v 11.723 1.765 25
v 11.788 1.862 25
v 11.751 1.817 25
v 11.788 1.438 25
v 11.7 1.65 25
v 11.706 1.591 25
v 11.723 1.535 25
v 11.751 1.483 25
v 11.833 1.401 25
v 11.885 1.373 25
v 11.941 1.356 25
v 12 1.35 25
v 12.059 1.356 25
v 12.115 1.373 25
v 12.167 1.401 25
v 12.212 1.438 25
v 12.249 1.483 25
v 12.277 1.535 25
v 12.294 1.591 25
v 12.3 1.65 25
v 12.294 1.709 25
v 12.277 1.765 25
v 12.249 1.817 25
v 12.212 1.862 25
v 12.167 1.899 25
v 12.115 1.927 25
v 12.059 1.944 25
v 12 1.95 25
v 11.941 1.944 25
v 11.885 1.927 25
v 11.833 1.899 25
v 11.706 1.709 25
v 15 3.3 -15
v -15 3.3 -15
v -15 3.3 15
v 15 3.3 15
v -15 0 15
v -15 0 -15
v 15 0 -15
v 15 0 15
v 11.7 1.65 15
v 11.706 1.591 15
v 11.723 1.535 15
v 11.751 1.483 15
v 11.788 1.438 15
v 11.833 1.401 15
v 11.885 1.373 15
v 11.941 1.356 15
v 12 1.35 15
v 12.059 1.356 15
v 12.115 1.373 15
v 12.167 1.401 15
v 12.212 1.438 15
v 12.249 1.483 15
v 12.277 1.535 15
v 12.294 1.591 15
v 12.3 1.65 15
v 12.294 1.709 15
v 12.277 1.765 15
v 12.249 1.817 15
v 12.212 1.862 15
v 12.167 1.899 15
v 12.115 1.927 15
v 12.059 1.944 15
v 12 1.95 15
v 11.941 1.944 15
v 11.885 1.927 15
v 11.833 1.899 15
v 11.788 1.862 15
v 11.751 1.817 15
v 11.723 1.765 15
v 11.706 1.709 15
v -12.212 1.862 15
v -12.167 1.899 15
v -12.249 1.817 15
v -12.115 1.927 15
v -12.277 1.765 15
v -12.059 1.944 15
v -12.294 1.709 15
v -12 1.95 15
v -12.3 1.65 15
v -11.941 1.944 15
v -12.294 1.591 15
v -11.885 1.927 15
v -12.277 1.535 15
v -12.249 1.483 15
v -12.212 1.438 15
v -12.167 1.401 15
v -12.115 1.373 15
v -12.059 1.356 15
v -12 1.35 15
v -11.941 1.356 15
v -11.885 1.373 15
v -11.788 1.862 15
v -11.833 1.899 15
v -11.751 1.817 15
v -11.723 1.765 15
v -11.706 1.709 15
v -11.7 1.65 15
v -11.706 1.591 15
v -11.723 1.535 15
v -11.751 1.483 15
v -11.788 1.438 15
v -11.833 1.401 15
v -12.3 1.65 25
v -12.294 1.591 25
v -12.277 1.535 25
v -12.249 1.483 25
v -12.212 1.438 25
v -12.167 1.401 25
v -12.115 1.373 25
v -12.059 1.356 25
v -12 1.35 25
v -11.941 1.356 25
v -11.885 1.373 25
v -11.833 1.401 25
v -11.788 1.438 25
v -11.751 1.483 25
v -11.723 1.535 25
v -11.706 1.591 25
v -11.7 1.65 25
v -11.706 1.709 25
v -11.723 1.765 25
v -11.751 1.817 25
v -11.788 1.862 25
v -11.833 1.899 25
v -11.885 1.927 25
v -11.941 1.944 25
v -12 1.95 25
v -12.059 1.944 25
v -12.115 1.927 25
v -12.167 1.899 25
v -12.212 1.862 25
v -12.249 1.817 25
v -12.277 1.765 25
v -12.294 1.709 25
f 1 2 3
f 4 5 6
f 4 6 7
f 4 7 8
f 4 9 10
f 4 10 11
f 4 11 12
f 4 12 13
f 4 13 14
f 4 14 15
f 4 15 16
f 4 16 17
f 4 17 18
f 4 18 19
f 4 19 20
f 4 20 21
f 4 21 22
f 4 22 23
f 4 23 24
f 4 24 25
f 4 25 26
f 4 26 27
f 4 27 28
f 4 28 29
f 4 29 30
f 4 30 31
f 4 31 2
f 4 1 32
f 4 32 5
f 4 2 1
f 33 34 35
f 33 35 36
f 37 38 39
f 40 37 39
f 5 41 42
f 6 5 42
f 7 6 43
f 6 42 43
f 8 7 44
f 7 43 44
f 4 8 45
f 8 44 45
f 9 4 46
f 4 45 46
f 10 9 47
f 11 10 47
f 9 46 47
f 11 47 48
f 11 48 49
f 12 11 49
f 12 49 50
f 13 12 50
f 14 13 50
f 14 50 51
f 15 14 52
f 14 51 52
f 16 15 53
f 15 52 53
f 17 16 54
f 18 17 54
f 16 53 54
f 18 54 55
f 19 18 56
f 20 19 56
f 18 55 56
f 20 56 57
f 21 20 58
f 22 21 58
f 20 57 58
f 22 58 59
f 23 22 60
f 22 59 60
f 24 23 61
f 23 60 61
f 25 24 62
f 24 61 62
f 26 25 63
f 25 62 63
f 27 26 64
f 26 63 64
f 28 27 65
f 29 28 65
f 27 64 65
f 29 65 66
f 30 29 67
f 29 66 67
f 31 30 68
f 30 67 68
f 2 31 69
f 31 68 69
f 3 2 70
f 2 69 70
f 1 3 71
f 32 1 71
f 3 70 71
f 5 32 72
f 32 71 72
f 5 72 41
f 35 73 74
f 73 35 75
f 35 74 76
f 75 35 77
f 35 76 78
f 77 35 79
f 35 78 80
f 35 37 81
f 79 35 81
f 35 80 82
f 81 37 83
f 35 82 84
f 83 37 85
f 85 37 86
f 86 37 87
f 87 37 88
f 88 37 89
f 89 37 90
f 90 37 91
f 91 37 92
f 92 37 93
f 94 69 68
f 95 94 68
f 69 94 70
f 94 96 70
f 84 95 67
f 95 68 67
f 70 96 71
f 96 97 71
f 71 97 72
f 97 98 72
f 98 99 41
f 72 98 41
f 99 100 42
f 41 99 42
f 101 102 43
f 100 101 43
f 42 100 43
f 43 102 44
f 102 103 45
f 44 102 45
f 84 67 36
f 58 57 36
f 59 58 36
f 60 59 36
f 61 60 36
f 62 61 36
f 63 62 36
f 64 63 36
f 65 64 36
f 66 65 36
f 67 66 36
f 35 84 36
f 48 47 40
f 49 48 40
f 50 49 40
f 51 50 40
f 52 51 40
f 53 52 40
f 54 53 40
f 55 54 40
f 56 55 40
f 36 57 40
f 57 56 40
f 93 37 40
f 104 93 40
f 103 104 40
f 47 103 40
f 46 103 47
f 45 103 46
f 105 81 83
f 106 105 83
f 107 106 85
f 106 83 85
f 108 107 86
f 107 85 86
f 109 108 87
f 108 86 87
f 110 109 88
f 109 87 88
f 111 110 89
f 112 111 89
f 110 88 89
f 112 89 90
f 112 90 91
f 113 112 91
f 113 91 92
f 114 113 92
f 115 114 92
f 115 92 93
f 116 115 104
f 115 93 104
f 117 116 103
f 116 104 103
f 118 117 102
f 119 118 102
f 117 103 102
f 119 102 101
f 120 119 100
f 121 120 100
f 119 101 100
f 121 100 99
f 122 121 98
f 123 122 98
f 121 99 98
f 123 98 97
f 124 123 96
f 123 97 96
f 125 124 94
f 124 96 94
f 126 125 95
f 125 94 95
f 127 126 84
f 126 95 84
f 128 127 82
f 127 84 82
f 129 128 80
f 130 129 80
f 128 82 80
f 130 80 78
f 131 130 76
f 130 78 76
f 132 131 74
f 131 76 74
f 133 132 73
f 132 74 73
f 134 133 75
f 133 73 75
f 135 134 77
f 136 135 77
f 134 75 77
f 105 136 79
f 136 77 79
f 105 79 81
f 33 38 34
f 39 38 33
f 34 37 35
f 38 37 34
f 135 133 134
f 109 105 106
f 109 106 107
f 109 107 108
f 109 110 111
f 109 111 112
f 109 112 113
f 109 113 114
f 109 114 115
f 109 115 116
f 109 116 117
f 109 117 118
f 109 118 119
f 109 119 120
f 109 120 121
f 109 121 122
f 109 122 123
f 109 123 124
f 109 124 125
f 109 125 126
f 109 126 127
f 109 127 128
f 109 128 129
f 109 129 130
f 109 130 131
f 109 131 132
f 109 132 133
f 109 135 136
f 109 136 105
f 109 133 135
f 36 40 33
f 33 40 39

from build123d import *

# Parameters (mm, degrees)
SKETCH_1_W      = 30
SKETCH_1_H      = 30
EXTRUDE_1_DEPTH = 3.3
SKETCH_2_R      = 0.3
EXTRUDE_2_DEPTH = 10


with BuildPart() as part:
    # 草图1 → 拉伸1 (new body)
    with BuildSketch(Plane(origin=(0, 0, 0), x_dir=(1, 0, 0), z_dir=(0, 1, 0))):
        Rectangle(SKETCH_1_W, SKETCH_1_H)
    extrude(amount=EXTRUDE_1_DEPTH)

    # 草图2 → 拉伸2 (add)
    with BuildSketch(Plane.XY.offset(15)):
        with Locations(Location((-12, 1.65, 0), (0, 0, 180))):
            Circle(SKETCH_2_R)
        with Locations(Location((12, 1.65, 0), (0, 0, 180))):
            Circle(SKETCH_2_R)
    extrude(amount=EXTRUDE_2_DEPTH)


solid = part.part
